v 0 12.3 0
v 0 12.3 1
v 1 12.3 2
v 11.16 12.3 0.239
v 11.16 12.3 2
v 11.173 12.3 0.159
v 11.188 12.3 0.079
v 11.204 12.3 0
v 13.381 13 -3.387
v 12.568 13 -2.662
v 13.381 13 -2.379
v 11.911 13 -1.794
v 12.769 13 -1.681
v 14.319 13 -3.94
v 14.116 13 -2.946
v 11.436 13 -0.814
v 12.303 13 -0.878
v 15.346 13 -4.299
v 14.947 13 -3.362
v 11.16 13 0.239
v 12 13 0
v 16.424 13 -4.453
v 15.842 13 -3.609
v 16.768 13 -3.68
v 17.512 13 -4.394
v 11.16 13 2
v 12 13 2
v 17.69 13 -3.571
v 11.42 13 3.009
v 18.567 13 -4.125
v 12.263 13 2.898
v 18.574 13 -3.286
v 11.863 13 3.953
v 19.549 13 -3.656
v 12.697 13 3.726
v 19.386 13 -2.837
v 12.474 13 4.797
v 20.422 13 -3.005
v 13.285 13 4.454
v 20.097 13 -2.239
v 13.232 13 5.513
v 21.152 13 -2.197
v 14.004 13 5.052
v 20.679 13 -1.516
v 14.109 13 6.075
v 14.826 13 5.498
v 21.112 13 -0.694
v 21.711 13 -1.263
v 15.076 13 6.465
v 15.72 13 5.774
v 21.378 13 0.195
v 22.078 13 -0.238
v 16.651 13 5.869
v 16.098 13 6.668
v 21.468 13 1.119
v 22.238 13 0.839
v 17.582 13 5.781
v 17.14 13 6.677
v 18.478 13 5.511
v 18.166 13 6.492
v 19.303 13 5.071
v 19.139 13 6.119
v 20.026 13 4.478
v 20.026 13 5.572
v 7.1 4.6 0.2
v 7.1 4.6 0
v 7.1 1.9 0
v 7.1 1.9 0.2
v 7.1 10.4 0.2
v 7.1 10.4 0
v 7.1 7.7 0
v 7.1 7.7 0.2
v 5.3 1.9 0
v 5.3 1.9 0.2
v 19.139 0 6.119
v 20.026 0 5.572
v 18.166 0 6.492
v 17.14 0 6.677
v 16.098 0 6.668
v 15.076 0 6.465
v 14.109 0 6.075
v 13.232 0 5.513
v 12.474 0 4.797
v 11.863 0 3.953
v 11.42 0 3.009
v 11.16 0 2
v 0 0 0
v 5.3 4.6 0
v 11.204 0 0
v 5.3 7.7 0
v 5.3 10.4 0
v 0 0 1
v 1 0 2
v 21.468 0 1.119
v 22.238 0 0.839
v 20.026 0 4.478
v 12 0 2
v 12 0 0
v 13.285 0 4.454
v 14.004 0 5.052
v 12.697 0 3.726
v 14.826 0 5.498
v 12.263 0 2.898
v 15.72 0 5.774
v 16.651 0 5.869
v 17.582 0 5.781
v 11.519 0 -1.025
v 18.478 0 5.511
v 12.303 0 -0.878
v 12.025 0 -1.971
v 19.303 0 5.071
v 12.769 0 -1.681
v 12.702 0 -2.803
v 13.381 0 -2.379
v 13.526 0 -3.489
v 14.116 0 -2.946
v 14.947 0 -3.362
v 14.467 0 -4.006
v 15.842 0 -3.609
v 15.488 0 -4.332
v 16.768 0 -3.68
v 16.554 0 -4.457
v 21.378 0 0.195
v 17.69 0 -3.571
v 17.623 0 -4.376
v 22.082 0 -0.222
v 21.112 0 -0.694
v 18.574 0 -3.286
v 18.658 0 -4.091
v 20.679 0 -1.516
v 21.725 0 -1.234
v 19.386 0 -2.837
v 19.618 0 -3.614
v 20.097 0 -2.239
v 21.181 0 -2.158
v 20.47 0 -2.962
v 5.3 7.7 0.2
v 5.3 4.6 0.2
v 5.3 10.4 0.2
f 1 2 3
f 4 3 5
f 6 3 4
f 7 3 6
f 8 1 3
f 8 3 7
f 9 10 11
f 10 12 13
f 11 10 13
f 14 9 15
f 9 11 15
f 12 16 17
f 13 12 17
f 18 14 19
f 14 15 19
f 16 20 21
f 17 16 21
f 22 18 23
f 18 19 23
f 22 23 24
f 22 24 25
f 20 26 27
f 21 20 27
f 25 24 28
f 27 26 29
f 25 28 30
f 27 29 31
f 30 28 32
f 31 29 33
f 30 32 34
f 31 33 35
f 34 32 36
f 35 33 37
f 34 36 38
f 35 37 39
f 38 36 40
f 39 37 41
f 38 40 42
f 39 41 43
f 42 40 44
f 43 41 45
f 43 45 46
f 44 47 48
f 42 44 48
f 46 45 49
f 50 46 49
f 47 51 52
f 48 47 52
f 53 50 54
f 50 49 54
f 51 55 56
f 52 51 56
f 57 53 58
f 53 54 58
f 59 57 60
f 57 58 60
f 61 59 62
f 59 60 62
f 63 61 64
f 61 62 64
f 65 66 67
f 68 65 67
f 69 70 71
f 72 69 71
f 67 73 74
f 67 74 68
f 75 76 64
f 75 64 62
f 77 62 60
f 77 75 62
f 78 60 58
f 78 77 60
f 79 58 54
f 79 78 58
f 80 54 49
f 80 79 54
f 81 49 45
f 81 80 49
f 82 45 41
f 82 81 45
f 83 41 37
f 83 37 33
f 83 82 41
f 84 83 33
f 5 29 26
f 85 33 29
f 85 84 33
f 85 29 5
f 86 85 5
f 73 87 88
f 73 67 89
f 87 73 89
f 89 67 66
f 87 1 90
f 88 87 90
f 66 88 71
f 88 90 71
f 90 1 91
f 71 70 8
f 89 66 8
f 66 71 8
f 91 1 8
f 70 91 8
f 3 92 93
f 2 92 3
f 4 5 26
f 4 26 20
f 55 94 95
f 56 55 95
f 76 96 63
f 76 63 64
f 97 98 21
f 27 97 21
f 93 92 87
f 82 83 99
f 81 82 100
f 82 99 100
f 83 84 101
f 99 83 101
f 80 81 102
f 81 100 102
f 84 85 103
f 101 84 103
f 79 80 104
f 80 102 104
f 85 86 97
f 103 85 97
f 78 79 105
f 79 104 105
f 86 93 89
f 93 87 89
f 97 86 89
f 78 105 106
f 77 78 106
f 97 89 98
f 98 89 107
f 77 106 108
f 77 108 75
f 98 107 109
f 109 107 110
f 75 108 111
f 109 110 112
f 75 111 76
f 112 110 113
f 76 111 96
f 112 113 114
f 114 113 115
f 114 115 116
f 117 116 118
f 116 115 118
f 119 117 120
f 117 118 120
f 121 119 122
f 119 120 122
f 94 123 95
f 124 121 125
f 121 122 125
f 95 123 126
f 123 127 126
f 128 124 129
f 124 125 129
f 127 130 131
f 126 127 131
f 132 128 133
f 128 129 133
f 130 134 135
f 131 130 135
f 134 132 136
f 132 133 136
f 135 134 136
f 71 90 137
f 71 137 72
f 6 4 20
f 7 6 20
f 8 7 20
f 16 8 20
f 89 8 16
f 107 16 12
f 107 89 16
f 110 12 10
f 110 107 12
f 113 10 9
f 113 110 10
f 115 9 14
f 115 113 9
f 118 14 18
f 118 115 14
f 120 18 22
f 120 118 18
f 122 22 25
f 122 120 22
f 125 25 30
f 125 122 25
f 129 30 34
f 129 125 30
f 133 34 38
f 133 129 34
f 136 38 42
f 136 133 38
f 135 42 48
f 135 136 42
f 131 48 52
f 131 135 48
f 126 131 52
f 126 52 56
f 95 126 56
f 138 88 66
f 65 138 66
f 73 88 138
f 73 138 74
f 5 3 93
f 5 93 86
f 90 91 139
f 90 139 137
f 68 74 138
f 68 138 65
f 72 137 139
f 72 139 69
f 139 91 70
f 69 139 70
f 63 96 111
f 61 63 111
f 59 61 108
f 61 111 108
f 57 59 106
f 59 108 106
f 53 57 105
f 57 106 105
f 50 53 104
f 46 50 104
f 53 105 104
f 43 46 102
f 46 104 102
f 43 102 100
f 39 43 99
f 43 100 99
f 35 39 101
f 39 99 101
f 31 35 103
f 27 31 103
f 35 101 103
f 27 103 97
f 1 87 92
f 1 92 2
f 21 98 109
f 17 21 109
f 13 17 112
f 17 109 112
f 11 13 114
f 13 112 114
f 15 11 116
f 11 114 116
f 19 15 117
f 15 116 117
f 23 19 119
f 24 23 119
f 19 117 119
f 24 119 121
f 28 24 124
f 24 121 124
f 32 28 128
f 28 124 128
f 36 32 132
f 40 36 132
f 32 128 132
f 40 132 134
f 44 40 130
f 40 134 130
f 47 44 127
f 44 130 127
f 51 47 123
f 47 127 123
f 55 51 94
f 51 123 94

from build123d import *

# Parameters (mm, degrees)
SKETCH_W     = 12
SKETCH_H     = 12.3
PAD_DEPTH    = 2
SKETCH001_W  = 1.8
SKETCH001_H  = 2.7
POCKET_DEPTH = 0.2
PAD001_DEPTH = 13
CHAMFER_SIZE = 1


with BuildPart() as part:
    # Sketch → Pad (new body)
    with BuildSketch(Plane.XY):
        with Locations((6, 6.15)):
            Rectangle(SKETCH_W, SKETCH_H)
    extrude(amount=PAD_DEPTH)

    # Sketch001 (on Face5 of Pad) → Pocket (cut)
    with BuildSketch(Plane(origin=(0, 0, 0), x_dir=(1, 0, 0), z_dir=(0, 0, -1))):
        with Locations((6.2, -3.25)):
            Rectangle(SKETCH001_W, SKETCH001_H)
        with Locations((6.2, -9.05)):
            Rectangle(SKETCH001_W, SKETCH001_H)
    extrude(amount=-POCKET_DEPTH, mode=Mode.SUBTRACT)

    # Sketch002 (on Face1 of Pocket) → Pad001 (join)
    with BuildSketch(Plane.XZ):
        with BuildLine():
            ThreePointArc((11.16, 0.23875), (16.969381, -4.45007), (22.238211, 0.838915))
            Line((21.467655, 1.119375), (22.238211, 0.838915))
            ThreePointArc((12, 0), (17.23124, -3.647424), (21.467655, 1.119375))
            Line((12, 2), (12, 0))
            ThreePointArc((20.026412, 4.478132), (15.266374, 5.657977), (12, 2))
            Line((20.026412, 4.478132), (20.026412, 5.572296))
            ThreePointArc((20.026412, 5.572296), (14.583244, 6.292865), (11.16, 2))
            Line((11.16, 2), (11.16, 0.23875))
        make_face()
    extrude(amount=-PAD001_DEPTH)

    # Chamfer
    chamfer_edges = [part.edges().sort_by_distance(p)[0] for p in [
        (0, 6.15, 2),
    ]]
    chamfer(chamfer_edges, length=CHAMFER_SIZE)


solid = part.part
